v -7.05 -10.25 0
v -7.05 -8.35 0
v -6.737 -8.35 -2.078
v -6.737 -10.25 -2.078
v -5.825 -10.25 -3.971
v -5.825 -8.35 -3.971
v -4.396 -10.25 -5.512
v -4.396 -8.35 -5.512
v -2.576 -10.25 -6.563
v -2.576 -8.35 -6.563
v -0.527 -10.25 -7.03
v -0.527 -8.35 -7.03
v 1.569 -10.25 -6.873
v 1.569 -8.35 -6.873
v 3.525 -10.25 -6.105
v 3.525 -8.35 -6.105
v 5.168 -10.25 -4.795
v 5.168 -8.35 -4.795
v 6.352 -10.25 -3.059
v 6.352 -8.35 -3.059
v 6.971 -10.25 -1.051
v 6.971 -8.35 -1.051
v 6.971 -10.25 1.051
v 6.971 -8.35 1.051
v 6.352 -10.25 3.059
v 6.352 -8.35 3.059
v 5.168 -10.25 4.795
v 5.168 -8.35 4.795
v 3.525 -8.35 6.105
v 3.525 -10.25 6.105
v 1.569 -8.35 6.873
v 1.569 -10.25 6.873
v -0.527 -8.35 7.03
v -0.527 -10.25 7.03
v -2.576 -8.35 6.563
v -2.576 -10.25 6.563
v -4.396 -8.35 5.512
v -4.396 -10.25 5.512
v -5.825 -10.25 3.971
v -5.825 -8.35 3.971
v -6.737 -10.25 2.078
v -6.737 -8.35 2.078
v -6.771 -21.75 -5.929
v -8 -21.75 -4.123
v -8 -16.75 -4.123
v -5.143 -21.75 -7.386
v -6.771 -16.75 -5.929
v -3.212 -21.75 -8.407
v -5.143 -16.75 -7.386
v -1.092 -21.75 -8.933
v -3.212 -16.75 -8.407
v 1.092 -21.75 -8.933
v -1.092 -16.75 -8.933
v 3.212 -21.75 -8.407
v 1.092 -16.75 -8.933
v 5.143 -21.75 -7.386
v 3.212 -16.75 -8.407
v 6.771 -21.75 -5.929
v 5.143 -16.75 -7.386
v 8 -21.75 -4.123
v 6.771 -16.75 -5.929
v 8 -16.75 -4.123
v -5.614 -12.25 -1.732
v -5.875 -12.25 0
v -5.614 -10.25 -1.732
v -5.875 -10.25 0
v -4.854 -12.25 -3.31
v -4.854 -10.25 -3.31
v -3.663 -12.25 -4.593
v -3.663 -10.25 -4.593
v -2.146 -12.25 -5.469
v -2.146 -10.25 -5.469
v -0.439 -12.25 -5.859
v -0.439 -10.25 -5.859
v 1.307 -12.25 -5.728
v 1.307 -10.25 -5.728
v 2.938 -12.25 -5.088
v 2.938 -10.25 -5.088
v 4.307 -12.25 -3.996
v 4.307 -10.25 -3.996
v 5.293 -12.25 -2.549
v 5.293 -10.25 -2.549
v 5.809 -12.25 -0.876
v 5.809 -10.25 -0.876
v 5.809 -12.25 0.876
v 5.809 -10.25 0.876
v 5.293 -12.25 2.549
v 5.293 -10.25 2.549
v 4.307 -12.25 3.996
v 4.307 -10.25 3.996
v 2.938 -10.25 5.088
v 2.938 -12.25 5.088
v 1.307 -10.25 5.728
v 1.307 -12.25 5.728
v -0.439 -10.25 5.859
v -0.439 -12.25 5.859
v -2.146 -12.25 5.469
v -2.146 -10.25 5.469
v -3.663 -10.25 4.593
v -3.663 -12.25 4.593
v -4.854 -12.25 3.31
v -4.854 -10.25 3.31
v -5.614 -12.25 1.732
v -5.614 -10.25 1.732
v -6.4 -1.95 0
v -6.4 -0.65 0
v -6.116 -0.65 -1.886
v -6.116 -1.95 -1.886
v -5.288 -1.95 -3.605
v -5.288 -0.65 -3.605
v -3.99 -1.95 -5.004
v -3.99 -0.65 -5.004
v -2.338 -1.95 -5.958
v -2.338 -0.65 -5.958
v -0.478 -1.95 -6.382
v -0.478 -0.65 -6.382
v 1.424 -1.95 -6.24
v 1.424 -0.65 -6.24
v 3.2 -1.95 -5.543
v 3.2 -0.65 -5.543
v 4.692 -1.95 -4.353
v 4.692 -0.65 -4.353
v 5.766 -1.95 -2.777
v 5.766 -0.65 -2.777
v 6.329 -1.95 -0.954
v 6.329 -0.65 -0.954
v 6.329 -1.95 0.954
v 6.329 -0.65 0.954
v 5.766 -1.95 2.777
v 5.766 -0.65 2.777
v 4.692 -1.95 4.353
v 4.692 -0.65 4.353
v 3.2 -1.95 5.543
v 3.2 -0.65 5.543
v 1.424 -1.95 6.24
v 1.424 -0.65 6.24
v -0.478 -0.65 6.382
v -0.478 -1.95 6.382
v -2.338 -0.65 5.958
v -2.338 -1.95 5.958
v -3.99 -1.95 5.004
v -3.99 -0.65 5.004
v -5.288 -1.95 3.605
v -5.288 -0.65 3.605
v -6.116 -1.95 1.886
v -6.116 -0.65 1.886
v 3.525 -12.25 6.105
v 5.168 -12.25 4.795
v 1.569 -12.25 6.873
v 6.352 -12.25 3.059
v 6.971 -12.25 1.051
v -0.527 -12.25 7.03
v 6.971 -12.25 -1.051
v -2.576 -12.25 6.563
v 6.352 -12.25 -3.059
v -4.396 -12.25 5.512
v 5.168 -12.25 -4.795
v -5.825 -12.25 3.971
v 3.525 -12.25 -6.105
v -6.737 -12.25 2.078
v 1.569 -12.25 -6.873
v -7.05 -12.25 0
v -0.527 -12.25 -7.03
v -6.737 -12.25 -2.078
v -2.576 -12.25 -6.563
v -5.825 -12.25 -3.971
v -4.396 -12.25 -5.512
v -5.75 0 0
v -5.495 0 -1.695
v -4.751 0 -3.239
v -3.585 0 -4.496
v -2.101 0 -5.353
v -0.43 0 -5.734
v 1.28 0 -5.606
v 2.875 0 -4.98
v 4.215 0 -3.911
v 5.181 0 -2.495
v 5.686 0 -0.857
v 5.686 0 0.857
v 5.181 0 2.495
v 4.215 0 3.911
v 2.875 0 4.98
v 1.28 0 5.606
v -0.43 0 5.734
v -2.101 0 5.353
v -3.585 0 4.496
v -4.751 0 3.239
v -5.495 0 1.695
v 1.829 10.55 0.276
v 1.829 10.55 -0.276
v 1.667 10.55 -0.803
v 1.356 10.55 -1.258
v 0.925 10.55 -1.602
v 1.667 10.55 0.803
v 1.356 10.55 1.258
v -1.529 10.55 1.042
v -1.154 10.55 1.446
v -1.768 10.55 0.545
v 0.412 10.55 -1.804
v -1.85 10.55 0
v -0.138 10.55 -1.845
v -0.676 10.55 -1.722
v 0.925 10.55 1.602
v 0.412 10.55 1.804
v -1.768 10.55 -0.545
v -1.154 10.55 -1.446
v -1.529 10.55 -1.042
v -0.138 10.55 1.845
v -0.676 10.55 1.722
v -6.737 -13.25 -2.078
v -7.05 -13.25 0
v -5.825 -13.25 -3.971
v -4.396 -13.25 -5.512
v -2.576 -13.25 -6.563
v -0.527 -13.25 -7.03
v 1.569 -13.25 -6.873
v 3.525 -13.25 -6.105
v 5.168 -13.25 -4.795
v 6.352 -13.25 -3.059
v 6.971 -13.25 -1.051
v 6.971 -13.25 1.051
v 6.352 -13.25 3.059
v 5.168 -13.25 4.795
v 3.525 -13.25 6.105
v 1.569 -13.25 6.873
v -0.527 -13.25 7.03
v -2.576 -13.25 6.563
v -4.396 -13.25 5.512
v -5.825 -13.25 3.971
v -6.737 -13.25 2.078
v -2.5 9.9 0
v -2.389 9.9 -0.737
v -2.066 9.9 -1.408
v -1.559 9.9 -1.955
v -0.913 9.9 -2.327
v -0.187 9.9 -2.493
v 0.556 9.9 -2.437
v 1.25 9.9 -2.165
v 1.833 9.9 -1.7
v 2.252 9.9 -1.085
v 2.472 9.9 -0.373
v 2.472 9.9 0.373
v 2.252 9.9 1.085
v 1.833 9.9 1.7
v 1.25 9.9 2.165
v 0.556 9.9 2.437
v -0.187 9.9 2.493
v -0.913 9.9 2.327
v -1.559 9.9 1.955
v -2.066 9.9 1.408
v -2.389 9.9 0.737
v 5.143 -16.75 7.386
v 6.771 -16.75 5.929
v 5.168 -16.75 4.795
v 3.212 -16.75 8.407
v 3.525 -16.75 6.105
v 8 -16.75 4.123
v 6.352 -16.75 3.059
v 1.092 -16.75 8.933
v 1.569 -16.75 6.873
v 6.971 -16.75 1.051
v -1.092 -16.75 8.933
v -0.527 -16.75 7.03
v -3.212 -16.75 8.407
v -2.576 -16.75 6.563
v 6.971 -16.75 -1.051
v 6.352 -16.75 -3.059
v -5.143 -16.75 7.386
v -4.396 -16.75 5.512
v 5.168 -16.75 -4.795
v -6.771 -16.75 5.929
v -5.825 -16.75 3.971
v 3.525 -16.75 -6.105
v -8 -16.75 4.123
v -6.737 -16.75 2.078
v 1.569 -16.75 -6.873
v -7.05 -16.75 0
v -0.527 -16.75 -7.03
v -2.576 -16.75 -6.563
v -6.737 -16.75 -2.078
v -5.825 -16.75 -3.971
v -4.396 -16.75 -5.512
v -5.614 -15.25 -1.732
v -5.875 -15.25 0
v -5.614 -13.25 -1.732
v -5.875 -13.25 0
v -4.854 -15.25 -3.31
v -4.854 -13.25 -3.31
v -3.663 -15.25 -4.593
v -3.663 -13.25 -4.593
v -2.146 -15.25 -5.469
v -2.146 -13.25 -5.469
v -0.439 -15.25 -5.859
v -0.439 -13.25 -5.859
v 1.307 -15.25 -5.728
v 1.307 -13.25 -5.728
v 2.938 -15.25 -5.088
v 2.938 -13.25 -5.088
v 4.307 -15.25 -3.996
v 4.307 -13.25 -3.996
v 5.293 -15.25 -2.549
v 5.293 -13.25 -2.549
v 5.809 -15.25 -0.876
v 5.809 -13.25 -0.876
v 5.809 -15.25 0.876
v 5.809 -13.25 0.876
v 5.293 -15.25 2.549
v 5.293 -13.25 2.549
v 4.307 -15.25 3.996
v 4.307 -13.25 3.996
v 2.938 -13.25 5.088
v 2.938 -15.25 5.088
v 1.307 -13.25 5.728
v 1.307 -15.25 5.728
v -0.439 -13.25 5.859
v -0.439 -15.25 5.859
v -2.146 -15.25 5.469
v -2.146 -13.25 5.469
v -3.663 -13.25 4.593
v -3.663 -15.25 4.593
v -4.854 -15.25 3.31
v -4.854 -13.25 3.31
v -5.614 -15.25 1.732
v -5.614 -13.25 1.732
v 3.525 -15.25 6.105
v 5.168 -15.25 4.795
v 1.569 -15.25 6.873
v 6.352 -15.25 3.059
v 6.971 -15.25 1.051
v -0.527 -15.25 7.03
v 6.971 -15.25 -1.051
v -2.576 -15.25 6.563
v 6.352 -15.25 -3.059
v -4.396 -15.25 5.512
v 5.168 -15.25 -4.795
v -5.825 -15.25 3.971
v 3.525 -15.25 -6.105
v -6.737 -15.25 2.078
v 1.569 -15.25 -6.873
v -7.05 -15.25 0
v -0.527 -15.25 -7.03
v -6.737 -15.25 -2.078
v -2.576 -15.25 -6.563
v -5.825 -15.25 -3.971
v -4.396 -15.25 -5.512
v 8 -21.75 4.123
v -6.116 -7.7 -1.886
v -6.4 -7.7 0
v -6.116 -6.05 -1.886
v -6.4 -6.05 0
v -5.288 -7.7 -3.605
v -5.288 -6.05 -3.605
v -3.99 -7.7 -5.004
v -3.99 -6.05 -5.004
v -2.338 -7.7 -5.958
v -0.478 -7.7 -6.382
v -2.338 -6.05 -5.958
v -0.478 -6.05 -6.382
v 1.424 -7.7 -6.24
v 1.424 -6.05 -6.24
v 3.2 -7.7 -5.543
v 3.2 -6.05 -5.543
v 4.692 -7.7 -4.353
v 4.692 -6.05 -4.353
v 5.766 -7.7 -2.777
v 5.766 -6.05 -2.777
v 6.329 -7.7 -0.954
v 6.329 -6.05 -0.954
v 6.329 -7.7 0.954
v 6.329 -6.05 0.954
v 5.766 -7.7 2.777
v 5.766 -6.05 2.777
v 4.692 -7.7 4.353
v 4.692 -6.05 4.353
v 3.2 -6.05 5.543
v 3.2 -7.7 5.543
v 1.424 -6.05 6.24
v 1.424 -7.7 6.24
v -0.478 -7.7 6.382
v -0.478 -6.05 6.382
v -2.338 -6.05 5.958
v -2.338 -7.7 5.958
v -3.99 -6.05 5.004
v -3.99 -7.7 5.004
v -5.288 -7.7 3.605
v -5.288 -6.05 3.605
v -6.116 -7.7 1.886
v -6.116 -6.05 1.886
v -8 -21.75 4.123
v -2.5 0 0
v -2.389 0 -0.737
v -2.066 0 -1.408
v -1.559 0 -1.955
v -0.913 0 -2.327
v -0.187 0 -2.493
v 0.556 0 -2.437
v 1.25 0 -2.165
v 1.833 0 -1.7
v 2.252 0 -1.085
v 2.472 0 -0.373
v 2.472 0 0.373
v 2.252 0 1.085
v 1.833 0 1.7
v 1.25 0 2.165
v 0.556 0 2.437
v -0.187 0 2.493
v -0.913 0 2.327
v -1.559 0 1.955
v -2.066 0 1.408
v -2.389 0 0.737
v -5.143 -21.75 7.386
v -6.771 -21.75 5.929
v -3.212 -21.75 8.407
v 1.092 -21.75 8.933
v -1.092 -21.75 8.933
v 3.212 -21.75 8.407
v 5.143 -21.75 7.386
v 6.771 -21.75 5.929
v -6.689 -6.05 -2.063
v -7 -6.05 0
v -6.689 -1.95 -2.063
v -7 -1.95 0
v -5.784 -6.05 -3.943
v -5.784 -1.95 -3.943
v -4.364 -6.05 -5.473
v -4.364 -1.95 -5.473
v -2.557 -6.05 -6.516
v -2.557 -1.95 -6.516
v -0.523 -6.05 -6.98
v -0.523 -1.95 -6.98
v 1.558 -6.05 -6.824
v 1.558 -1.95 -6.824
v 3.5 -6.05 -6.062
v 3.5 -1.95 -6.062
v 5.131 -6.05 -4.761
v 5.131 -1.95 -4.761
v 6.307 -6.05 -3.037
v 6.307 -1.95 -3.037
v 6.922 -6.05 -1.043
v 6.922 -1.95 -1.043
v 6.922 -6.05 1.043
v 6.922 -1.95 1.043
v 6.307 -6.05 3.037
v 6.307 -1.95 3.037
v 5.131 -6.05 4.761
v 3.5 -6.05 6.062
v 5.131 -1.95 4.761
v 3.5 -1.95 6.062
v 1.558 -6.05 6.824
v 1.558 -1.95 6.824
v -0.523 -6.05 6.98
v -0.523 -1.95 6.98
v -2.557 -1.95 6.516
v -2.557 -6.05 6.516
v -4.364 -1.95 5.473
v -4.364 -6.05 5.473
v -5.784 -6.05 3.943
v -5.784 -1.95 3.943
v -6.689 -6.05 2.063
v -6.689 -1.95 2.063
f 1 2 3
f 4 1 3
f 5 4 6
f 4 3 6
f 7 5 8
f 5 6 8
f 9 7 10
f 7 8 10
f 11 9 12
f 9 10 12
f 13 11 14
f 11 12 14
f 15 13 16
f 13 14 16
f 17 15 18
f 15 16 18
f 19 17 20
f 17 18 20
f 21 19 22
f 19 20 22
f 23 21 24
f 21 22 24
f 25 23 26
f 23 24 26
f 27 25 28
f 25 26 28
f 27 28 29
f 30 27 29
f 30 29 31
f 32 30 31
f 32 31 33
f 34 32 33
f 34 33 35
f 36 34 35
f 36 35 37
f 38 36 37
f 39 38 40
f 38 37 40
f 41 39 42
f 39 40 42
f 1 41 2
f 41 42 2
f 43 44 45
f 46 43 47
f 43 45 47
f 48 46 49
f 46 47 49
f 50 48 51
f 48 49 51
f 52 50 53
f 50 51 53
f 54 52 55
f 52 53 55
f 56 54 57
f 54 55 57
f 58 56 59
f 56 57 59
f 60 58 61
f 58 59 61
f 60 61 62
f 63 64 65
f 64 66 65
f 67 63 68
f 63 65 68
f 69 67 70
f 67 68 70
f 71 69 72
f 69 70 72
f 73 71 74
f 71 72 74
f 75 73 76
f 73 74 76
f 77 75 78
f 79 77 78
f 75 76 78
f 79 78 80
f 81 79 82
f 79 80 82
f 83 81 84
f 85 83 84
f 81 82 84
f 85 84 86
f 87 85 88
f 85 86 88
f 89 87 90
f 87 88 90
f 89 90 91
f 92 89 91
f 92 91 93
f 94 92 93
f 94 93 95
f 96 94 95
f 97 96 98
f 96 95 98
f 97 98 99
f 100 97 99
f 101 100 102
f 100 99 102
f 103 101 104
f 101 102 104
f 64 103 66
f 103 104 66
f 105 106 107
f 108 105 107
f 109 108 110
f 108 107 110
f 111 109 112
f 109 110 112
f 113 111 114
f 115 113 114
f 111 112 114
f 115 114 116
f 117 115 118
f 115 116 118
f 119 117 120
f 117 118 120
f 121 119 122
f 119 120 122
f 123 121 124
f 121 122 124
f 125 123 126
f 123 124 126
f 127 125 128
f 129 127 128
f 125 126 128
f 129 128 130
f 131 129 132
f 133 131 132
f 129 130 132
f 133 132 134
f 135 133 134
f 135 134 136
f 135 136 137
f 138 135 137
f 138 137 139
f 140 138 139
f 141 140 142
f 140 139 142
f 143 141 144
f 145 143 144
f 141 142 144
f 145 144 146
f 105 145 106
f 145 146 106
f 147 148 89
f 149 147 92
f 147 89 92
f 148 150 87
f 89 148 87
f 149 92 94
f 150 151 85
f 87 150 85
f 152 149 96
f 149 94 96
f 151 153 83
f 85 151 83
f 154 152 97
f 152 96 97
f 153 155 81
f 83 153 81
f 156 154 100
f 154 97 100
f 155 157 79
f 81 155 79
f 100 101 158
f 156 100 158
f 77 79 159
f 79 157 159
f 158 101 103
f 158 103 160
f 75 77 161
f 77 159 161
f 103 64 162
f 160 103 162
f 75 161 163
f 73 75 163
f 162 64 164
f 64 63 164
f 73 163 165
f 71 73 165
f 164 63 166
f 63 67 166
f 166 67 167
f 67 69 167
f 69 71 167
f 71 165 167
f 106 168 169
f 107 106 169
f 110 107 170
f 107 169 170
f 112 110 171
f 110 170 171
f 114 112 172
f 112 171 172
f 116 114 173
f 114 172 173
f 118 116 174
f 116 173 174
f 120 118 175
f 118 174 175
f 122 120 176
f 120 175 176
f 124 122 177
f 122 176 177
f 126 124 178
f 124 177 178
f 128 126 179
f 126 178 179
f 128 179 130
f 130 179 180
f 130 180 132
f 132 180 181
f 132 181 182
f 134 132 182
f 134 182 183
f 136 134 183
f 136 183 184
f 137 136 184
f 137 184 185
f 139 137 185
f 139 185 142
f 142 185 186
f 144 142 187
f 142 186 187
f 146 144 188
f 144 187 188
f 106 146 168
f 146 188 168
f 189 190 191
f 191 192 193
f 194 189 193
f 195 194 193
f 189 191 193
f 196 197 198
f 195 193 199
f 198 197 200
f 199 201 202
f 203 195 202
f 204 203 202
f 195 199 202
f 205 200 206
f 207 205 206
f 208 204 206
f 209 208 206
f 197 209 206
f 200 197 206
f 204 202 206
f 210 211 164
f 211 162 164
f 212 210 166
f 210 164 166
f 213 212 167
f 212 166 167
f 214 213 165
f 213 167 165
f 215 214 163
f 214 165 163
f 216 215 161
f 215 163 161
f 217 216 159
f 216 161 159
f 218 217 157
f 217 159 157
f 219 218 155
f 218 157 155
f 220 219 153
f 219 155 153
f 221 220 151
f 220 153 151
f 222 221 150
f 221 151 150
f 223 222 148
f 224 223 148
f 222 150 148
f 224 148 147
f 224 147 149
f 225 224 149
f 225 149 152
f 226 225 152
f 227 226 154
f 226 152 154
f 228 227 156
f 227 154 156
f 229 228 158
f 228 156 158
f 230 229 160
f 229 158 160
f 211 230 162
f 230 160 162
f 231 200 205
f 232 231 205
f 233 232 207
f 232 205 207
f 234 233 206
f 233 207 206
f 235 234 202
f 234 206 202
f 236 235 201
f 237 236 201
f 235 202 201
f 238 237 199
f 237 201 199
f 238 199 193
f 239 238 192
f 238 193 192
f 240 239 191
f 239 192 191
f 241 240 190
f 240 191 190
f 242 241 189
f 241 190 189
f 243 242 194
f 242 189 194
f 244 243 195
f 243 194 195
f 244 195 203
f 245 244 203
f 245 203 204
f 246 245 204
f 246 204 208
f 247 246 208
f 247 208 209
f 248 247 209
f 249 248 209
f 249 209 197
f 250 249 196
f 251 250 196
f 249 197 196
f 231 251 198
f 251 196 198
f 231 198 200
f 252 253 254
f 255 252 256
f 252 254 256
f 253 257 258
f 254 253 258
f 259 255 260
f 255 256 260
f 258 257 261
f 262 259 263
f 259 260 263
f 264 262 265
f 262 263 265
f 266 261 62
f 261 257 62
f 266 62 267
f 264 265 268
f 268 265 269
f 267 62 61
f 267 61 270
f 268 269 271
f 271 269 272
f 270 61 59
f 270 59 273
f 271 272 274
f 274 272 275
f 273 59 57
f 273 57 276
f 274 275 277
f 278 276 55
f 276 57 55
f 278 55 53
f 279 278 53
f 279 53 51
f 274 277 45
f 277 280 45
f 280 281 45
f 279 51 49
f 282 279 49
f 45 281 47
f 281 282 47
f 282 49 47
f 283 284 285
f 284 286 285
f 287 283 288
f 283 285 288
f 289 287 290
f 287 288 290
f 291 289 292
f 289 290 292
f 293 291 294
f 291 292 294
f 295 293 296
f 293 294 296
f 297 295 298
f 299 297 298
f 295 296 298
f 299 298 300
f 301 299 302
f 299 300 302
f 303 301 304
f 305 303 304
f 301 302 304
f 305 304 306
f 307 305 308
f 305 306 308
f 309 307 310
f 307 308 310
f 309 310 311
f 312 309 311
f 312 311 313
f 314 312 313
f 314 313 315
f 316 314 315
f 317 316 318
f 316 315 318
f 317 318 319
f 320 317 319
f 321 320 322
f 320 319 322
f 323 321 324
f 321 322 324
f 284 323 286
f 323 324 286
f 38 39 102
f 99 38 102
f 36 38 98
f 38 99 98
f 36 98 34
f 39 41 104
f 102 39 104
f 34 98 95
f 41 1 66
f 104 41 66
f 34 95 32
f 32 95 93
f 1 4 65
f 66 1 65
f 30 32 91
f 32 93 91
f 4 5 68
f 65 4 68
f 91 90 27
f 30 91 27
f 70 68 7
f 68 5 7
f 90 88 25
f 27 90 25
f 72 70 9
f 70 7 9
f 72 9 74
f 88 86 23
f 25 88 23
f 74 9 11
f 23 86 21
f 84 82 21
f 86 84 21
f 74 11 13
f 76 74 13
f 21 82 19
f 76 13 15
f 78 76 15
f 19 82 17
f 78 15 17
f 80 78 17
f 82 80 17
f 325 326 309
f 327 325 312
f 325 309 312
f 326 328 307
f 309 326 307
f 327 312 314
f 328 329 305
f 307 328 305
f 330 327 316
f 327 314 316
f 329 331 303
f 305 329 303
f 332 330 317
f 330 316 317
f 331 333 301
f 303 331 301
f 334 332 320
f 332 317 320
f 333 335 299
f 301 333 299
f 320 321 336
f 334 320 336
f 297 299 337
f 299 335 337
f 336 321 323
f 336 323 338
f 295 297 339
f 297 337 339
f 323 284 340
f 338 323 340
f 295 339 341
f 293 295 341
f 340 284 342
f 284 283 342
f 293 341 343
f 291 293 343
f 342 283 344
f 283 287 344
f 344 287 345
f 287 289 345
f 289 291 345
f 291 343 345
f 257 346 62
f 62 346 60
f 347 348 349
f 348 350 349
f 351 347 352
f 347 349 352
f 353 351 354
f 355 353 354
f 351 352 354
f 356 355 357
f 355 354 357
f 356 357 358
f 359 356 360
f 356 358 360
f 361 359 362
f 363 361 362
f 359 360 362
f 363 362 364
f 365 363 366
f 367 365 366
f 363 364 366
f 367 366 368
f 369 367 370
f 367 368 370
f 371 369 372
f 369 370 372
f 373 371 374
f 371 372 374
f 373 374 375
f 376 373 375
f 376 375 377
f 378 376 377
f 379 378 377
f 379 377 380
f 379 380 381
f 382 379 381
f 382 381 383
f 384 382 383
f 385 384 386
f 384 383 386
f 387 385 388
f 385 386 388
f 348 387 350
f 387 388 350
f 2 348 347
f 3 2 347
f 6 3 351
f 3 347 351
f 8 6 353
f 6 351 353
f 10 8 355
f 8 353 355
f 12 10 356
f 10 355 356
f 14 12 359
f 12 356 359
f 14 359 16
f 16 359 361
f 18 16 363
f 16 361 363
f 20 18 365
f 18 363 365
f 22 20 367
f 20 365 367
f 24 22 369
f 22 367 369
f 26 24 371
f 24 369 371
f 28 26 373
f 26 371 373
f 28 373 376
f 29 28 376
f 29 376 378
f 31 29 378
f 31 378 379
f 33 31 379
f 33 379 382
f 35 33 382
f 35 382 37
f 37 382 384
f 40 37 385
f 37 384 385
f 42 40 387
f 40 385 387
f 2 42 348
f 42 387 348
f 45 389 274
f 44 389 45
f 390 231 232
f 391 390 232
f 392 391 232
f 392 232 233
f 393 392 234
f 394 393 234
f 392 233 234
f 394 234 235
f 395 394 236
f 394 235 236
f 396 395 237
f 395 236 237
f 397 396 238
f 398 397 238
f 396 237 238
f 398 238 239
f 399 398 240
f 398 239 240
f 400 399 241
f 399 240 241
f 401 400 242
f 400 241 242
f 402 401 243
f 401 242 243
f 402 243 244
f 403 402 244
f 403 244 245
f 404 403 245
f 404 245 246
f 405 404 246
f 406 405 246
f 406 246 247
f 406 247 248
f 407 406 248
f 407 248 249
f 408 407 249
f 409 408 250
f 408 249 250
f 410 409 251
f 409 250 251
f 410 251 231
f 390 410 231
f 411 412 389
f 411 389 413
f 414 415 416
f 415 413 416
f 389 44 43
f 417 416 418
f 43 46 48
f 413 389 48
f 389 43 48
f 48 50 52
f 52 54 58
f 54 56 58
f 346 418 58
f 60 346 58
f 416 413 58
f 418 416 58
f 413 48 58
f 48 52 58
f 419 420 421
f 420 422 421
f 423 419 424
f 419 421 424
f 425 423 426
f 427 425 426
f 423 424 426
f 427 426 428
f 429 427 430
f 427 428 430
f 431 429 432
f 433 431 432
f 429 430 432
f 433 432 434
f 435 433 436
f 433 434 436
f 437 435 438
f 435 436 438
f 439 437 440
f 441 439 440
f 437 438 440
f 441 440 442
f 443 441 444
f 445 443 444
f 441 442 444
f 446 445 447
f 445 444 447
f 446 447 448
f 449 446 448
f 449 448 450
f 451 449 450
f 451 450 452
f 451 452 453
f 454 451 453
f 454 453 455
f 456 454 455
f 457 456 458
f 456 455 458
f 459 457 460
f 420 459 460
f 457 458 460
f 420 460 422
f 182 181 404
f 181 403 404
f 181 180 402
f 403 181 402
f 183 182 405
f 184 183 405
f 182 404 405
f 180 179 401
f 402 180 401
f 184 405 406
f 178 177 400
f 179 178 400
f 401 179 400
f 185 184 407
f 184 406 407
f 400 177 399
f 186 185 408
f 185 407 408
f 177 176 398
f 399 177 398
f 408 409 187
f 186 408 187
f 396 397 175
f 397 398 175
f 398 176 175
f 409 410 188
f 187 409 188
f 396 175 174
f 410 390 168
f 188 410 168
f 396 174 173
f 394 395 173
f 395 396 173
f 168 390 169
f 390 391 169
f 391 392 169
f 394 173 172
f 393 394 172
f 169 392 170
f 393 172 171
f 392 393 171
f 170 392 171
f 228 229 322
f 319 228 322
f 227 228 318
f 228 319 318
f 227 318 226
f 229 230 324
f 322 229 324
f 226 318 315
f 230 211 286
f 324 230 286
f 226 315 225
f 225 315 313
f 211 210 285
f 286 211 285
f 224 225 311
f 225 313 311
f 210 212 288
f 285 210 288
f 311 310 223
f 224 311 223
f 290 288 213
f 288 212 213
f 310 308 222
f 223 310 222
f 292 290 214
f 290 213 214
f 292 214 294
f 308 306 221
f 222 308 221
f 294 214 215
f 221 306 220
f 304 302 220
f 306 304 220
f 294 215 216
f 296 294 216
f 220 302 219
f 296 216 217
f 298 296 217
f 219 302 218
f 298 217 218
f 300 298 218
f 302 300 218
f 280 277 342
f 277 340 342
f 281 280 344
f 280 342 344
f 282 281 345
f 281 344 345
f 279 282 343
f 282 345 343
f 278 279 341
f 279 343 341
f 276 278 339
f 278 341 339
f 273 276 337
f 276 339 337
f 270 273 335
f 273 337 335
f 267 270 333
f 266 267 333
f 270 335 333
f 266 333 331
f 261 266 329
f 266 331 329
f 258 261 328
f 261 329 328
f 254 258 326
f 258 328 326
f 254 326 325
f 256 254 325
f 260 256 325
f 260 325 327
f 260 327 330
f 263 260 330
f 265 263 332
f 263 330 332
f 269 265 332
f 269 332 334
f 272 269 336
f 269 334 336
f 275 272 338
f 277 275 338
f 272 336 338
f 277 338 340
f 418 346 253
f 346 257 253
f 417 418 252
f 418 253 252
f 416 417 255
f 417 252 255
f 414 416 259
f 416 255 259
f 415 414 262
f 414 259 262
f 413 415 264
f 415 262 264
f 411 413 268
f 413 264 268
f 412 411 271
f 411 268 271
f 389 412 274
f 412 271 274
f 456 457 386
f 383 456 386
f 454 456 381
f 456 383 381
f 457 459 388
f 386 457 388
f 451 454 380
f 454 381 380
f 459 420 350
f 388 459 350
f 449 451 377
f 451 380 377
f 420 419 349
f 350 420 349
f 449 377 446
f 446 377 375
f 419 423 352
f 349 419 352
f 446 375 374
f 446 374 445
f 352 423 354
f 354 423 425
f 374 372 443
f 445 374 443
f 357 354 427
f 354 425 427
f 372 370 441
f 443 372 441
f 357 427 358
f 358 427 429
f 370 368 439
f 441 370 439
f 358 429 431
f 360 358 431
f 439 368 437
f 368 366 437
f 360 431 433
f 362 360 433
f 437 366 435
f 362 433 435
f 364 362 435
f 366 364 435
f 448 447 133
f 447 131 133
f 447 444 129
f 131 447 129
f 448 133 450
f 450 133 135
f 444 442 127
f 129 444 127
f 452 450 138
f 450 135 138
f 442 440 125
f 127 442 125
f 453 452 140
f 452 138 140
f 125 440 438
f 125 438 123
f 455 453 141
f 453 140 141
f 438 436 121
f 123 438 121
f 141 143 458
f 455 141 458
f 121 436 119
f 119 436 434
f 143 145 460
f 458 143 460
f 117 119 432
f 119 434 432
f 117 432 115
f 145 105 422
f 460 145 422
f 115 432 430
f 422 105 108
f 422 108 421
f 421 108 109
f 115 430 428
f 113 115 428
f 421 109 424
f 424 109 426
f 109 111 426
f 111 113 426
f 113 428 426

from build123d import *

# Parameters (mm, degrees)
ENL_V_MAT_EXTRU_1_DEPTH = 35.71728676
CHANFREIN1_SIZE         = 0.65


with BuildPart() as part:
    # Esquisse1 → Révolution1 (revolve)
    with BuildSketch(Plane.XY):
        Polygon((0, -21.75), (-9, -21.75), (-9, -16.75), (-7.05, -16.75), (-7.05, -15.25), (-5.875, -15.25), (-5.875, -13.25), (-7.05, -13.25), (-7.05, -12.25), (-5.875, -12.25), (-5.875, -10.25), (-7.05, -10.25), (-7.05, -7.7), (-6.4, -7.7), (-6.4, -6.05), (-7, -6.05), (-7, -1.95), (-6.4, -1.95), (-6.4, 0), (-2.5, 0), (-2.5, 10.55), (0, 10.55), (0, 0), align=None)
    revolve(axis=Axis((0, 0, 0), (0, -1, 0)))

    # Esquisse2 → Enlèv. mat.-Extru.1 (cut, through all)
    with BuildSketch(Plane.XZ.offset(21.75)):
        with BuildLine():
            Line((8, 4.123105626), (8, -4.123105626))
            ThreePointArc((8, -4.123105626), (9, 0), (8, 4.123105626))
        make_face()
        with BuildLine():
            Line((-8, 4.123105626), (-8, -4.123105626))
            ThreePointArc((-8, -4.123105626), (-9, 0), (-8, 4.123105626))
        make_face()
    extrude(amount=-ENL_V_MAT_EXTRU_1_DEPTH, mode=Mode.SUBTRACT)

    # Chanfrein1
    chanfrein1_edges = [part.edges().sort_by_distance(p)[0] for p in [
        (2.5, 10.55, 0),
        (6.4, 0, 0),
        (7.05, -7.7, 0),
    ]]
    chamfer(chanfrein1_edges, length=CHANFREIN1_SIZE - 0.0001)  # a hair under: the kernel refuses the full size


solid = part.part
